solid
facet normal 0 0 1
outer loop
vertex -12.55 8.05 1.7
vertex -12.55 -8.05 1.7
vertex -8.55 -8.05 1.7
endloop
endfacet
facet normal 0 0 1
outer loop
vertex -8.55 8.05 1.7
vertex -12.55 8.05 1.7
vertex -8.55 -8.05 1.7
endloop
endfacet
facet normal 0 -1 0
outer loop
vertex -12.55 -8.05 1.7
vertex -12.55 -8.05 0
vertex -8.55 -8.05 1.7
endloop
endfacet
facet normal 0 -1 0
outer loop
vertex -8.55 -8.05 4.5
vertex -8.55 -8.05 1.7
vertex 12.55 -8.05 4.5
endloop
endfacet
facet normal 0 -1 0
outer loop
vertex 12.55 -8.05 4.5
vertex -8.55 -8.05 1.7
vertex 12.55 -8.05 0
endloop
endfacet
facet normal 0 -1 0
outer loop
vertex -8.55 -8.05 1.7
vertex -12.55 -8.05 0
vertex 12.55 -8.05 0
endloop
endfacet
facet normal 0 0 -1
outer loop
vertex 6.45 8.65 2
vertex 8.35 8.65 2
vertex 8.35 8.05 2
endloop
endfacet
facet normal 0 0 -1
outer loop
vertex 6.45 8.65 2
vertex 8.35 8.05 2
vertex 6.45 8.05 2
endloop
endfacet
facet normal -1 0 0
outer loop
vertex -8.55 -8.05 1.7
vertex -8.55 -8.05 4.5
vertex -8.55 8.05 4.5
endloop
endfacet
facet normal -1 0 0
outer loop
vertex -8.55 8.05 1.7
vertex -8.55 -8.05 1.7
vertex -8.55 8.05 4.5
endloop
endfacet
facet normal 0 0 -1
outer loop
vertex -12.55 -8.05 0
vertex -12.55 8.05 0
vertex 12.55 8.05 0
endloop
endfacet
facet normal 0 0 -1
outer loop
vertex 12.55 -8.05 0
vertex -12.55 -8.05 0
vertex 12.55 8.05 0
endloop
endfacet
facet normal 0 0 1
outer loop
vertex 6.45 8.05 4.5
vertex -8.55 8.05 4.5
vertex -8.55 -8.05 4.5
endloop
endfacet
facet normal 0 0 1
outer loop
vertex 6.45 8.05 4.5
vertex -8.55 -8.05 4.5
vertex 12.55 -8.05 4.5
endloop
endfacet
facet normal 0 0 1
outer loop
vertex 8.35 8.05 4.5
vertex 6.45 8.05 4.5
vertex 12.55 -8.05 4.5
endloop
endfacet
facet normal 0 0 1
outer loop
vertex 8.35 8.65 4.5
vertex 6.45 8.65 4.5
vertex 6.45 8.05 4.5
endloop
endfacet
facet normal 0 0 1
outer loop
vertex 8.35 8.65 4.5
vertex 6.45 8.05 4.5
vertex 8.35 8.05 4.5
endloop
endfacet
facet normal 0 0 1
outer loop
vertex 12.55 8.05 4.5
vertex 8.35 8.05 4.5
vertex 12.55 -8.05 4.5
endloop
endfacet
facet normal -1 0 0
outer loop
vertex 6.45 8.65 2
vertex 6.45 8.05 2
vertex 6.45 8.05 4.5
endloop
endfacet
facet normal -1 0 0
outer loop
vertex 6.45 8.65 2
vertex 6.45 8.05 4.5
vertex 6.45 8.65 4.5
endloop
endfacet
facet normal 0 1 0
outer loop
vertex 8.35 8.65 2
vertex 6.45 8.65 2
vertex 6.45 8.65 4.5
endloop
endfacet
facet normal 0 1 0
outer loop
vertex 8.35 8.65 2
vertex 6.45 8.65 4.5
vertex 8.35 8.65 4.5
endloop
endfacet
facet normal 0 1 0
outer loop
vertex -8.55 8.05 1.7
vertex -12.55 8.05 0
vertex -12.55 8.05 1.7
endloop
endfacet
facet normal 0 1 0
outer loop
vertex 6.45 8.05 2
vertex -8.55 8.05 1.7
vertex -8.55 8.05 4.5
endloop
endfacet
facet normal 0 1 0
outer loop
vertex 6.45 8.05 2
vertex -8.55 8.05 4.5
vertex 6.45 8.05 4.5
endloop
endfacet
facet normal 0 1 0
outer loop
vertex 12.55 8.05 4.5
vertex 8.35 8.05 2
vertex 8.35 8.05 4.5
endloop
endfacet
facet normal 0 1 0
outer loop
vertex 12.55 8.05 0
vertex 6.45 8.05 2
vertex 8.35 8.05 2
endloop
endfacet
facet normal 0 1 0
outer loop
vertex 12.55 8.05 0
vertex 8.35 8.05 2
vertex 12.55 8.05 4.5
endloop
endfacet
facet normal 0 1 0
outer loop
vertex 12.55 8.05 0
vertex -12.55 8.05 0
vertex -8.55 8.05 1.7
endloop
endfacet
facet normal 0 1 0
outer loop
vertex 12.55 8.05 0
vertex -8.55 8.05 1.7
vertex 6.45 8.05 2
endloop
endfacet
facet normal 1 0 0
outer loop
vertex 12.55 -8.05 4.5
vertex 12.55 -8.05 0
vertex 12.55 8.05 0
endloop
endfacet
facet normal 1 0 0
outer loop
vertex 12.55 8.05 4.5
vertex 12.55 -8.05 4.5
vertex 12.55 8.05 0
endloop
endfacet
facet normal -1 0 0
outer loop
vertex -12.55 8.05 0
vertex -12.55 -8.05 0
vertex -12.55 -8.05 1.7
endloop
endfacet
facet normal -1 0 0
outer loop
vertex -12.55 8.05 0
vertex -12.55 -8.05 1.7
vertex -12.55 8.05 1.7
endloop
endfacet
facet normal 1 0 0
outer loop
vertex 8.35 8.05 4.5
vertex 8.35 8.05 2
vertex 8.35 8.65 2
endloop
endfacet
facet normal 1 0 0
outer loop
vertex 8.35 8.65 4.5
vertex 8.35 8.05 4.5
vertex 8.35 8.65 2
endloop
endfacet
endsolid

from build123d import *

# Parameters (mm, degrees)
SKETCH_1_W          = 25.1
SKETCH_1_H          = 16.1
SKETCH_1_W_2        = 1.9
SKETCH_1_H_2        = 0.6
EXTRUDE_1_DEPTH     = 4.5
SKETCH_2_W          = 1.9
SKETCH_2_H          = 0.6
CUT_EXTRUDE_1_DEPTH = 2
SKETCH_3_W          = 4
SKETCH_3_H          = 16.1
CUT_EXTRUDE_2_DEPTH = 2.8


with BuildPart() as part:
    # 草图1 → 凸台-拉伸1 (new body)
    with BuildSketch(Plane.XY):
        Rectangle(SKETCH_1_W, SKETCH_1_H)
        with Locations((7.4, 8.35)):
            Rectangle(SKETCH_1_W_2, SKETCH_1_H_2)
    extrude(amount=EXTRUDE_1_DEPTH)

    # 草图2 → 切除-拉伸1 (cut)
    with BuildSketch(Plane(origin=(0, 0, 0), x_dir=(-1, 0, 0), z_dir=(0, 0, -1))):
        with Locations((-7.4, 8.35)):
            Rectangle(SKETCH_2_W, SKETCH_2_H)
    extrude(amount=-CUT_EXTRUDE_1_DEPTH, mode=Mode.SUBTRACT)

    # 草图3 → 切除-拉伸2 (cut)
    with BuildSketch(Plane.XY.offset(4.5)):
        with Locations((-10.55, 0)):
            Rectangle(SKETCH_3_W, SKETCH_3_H)
    extrude(amount=-CUT_EXTRUDE_2_DEPTH, mode=Mode.SUBTRACT)


solid = part.part
